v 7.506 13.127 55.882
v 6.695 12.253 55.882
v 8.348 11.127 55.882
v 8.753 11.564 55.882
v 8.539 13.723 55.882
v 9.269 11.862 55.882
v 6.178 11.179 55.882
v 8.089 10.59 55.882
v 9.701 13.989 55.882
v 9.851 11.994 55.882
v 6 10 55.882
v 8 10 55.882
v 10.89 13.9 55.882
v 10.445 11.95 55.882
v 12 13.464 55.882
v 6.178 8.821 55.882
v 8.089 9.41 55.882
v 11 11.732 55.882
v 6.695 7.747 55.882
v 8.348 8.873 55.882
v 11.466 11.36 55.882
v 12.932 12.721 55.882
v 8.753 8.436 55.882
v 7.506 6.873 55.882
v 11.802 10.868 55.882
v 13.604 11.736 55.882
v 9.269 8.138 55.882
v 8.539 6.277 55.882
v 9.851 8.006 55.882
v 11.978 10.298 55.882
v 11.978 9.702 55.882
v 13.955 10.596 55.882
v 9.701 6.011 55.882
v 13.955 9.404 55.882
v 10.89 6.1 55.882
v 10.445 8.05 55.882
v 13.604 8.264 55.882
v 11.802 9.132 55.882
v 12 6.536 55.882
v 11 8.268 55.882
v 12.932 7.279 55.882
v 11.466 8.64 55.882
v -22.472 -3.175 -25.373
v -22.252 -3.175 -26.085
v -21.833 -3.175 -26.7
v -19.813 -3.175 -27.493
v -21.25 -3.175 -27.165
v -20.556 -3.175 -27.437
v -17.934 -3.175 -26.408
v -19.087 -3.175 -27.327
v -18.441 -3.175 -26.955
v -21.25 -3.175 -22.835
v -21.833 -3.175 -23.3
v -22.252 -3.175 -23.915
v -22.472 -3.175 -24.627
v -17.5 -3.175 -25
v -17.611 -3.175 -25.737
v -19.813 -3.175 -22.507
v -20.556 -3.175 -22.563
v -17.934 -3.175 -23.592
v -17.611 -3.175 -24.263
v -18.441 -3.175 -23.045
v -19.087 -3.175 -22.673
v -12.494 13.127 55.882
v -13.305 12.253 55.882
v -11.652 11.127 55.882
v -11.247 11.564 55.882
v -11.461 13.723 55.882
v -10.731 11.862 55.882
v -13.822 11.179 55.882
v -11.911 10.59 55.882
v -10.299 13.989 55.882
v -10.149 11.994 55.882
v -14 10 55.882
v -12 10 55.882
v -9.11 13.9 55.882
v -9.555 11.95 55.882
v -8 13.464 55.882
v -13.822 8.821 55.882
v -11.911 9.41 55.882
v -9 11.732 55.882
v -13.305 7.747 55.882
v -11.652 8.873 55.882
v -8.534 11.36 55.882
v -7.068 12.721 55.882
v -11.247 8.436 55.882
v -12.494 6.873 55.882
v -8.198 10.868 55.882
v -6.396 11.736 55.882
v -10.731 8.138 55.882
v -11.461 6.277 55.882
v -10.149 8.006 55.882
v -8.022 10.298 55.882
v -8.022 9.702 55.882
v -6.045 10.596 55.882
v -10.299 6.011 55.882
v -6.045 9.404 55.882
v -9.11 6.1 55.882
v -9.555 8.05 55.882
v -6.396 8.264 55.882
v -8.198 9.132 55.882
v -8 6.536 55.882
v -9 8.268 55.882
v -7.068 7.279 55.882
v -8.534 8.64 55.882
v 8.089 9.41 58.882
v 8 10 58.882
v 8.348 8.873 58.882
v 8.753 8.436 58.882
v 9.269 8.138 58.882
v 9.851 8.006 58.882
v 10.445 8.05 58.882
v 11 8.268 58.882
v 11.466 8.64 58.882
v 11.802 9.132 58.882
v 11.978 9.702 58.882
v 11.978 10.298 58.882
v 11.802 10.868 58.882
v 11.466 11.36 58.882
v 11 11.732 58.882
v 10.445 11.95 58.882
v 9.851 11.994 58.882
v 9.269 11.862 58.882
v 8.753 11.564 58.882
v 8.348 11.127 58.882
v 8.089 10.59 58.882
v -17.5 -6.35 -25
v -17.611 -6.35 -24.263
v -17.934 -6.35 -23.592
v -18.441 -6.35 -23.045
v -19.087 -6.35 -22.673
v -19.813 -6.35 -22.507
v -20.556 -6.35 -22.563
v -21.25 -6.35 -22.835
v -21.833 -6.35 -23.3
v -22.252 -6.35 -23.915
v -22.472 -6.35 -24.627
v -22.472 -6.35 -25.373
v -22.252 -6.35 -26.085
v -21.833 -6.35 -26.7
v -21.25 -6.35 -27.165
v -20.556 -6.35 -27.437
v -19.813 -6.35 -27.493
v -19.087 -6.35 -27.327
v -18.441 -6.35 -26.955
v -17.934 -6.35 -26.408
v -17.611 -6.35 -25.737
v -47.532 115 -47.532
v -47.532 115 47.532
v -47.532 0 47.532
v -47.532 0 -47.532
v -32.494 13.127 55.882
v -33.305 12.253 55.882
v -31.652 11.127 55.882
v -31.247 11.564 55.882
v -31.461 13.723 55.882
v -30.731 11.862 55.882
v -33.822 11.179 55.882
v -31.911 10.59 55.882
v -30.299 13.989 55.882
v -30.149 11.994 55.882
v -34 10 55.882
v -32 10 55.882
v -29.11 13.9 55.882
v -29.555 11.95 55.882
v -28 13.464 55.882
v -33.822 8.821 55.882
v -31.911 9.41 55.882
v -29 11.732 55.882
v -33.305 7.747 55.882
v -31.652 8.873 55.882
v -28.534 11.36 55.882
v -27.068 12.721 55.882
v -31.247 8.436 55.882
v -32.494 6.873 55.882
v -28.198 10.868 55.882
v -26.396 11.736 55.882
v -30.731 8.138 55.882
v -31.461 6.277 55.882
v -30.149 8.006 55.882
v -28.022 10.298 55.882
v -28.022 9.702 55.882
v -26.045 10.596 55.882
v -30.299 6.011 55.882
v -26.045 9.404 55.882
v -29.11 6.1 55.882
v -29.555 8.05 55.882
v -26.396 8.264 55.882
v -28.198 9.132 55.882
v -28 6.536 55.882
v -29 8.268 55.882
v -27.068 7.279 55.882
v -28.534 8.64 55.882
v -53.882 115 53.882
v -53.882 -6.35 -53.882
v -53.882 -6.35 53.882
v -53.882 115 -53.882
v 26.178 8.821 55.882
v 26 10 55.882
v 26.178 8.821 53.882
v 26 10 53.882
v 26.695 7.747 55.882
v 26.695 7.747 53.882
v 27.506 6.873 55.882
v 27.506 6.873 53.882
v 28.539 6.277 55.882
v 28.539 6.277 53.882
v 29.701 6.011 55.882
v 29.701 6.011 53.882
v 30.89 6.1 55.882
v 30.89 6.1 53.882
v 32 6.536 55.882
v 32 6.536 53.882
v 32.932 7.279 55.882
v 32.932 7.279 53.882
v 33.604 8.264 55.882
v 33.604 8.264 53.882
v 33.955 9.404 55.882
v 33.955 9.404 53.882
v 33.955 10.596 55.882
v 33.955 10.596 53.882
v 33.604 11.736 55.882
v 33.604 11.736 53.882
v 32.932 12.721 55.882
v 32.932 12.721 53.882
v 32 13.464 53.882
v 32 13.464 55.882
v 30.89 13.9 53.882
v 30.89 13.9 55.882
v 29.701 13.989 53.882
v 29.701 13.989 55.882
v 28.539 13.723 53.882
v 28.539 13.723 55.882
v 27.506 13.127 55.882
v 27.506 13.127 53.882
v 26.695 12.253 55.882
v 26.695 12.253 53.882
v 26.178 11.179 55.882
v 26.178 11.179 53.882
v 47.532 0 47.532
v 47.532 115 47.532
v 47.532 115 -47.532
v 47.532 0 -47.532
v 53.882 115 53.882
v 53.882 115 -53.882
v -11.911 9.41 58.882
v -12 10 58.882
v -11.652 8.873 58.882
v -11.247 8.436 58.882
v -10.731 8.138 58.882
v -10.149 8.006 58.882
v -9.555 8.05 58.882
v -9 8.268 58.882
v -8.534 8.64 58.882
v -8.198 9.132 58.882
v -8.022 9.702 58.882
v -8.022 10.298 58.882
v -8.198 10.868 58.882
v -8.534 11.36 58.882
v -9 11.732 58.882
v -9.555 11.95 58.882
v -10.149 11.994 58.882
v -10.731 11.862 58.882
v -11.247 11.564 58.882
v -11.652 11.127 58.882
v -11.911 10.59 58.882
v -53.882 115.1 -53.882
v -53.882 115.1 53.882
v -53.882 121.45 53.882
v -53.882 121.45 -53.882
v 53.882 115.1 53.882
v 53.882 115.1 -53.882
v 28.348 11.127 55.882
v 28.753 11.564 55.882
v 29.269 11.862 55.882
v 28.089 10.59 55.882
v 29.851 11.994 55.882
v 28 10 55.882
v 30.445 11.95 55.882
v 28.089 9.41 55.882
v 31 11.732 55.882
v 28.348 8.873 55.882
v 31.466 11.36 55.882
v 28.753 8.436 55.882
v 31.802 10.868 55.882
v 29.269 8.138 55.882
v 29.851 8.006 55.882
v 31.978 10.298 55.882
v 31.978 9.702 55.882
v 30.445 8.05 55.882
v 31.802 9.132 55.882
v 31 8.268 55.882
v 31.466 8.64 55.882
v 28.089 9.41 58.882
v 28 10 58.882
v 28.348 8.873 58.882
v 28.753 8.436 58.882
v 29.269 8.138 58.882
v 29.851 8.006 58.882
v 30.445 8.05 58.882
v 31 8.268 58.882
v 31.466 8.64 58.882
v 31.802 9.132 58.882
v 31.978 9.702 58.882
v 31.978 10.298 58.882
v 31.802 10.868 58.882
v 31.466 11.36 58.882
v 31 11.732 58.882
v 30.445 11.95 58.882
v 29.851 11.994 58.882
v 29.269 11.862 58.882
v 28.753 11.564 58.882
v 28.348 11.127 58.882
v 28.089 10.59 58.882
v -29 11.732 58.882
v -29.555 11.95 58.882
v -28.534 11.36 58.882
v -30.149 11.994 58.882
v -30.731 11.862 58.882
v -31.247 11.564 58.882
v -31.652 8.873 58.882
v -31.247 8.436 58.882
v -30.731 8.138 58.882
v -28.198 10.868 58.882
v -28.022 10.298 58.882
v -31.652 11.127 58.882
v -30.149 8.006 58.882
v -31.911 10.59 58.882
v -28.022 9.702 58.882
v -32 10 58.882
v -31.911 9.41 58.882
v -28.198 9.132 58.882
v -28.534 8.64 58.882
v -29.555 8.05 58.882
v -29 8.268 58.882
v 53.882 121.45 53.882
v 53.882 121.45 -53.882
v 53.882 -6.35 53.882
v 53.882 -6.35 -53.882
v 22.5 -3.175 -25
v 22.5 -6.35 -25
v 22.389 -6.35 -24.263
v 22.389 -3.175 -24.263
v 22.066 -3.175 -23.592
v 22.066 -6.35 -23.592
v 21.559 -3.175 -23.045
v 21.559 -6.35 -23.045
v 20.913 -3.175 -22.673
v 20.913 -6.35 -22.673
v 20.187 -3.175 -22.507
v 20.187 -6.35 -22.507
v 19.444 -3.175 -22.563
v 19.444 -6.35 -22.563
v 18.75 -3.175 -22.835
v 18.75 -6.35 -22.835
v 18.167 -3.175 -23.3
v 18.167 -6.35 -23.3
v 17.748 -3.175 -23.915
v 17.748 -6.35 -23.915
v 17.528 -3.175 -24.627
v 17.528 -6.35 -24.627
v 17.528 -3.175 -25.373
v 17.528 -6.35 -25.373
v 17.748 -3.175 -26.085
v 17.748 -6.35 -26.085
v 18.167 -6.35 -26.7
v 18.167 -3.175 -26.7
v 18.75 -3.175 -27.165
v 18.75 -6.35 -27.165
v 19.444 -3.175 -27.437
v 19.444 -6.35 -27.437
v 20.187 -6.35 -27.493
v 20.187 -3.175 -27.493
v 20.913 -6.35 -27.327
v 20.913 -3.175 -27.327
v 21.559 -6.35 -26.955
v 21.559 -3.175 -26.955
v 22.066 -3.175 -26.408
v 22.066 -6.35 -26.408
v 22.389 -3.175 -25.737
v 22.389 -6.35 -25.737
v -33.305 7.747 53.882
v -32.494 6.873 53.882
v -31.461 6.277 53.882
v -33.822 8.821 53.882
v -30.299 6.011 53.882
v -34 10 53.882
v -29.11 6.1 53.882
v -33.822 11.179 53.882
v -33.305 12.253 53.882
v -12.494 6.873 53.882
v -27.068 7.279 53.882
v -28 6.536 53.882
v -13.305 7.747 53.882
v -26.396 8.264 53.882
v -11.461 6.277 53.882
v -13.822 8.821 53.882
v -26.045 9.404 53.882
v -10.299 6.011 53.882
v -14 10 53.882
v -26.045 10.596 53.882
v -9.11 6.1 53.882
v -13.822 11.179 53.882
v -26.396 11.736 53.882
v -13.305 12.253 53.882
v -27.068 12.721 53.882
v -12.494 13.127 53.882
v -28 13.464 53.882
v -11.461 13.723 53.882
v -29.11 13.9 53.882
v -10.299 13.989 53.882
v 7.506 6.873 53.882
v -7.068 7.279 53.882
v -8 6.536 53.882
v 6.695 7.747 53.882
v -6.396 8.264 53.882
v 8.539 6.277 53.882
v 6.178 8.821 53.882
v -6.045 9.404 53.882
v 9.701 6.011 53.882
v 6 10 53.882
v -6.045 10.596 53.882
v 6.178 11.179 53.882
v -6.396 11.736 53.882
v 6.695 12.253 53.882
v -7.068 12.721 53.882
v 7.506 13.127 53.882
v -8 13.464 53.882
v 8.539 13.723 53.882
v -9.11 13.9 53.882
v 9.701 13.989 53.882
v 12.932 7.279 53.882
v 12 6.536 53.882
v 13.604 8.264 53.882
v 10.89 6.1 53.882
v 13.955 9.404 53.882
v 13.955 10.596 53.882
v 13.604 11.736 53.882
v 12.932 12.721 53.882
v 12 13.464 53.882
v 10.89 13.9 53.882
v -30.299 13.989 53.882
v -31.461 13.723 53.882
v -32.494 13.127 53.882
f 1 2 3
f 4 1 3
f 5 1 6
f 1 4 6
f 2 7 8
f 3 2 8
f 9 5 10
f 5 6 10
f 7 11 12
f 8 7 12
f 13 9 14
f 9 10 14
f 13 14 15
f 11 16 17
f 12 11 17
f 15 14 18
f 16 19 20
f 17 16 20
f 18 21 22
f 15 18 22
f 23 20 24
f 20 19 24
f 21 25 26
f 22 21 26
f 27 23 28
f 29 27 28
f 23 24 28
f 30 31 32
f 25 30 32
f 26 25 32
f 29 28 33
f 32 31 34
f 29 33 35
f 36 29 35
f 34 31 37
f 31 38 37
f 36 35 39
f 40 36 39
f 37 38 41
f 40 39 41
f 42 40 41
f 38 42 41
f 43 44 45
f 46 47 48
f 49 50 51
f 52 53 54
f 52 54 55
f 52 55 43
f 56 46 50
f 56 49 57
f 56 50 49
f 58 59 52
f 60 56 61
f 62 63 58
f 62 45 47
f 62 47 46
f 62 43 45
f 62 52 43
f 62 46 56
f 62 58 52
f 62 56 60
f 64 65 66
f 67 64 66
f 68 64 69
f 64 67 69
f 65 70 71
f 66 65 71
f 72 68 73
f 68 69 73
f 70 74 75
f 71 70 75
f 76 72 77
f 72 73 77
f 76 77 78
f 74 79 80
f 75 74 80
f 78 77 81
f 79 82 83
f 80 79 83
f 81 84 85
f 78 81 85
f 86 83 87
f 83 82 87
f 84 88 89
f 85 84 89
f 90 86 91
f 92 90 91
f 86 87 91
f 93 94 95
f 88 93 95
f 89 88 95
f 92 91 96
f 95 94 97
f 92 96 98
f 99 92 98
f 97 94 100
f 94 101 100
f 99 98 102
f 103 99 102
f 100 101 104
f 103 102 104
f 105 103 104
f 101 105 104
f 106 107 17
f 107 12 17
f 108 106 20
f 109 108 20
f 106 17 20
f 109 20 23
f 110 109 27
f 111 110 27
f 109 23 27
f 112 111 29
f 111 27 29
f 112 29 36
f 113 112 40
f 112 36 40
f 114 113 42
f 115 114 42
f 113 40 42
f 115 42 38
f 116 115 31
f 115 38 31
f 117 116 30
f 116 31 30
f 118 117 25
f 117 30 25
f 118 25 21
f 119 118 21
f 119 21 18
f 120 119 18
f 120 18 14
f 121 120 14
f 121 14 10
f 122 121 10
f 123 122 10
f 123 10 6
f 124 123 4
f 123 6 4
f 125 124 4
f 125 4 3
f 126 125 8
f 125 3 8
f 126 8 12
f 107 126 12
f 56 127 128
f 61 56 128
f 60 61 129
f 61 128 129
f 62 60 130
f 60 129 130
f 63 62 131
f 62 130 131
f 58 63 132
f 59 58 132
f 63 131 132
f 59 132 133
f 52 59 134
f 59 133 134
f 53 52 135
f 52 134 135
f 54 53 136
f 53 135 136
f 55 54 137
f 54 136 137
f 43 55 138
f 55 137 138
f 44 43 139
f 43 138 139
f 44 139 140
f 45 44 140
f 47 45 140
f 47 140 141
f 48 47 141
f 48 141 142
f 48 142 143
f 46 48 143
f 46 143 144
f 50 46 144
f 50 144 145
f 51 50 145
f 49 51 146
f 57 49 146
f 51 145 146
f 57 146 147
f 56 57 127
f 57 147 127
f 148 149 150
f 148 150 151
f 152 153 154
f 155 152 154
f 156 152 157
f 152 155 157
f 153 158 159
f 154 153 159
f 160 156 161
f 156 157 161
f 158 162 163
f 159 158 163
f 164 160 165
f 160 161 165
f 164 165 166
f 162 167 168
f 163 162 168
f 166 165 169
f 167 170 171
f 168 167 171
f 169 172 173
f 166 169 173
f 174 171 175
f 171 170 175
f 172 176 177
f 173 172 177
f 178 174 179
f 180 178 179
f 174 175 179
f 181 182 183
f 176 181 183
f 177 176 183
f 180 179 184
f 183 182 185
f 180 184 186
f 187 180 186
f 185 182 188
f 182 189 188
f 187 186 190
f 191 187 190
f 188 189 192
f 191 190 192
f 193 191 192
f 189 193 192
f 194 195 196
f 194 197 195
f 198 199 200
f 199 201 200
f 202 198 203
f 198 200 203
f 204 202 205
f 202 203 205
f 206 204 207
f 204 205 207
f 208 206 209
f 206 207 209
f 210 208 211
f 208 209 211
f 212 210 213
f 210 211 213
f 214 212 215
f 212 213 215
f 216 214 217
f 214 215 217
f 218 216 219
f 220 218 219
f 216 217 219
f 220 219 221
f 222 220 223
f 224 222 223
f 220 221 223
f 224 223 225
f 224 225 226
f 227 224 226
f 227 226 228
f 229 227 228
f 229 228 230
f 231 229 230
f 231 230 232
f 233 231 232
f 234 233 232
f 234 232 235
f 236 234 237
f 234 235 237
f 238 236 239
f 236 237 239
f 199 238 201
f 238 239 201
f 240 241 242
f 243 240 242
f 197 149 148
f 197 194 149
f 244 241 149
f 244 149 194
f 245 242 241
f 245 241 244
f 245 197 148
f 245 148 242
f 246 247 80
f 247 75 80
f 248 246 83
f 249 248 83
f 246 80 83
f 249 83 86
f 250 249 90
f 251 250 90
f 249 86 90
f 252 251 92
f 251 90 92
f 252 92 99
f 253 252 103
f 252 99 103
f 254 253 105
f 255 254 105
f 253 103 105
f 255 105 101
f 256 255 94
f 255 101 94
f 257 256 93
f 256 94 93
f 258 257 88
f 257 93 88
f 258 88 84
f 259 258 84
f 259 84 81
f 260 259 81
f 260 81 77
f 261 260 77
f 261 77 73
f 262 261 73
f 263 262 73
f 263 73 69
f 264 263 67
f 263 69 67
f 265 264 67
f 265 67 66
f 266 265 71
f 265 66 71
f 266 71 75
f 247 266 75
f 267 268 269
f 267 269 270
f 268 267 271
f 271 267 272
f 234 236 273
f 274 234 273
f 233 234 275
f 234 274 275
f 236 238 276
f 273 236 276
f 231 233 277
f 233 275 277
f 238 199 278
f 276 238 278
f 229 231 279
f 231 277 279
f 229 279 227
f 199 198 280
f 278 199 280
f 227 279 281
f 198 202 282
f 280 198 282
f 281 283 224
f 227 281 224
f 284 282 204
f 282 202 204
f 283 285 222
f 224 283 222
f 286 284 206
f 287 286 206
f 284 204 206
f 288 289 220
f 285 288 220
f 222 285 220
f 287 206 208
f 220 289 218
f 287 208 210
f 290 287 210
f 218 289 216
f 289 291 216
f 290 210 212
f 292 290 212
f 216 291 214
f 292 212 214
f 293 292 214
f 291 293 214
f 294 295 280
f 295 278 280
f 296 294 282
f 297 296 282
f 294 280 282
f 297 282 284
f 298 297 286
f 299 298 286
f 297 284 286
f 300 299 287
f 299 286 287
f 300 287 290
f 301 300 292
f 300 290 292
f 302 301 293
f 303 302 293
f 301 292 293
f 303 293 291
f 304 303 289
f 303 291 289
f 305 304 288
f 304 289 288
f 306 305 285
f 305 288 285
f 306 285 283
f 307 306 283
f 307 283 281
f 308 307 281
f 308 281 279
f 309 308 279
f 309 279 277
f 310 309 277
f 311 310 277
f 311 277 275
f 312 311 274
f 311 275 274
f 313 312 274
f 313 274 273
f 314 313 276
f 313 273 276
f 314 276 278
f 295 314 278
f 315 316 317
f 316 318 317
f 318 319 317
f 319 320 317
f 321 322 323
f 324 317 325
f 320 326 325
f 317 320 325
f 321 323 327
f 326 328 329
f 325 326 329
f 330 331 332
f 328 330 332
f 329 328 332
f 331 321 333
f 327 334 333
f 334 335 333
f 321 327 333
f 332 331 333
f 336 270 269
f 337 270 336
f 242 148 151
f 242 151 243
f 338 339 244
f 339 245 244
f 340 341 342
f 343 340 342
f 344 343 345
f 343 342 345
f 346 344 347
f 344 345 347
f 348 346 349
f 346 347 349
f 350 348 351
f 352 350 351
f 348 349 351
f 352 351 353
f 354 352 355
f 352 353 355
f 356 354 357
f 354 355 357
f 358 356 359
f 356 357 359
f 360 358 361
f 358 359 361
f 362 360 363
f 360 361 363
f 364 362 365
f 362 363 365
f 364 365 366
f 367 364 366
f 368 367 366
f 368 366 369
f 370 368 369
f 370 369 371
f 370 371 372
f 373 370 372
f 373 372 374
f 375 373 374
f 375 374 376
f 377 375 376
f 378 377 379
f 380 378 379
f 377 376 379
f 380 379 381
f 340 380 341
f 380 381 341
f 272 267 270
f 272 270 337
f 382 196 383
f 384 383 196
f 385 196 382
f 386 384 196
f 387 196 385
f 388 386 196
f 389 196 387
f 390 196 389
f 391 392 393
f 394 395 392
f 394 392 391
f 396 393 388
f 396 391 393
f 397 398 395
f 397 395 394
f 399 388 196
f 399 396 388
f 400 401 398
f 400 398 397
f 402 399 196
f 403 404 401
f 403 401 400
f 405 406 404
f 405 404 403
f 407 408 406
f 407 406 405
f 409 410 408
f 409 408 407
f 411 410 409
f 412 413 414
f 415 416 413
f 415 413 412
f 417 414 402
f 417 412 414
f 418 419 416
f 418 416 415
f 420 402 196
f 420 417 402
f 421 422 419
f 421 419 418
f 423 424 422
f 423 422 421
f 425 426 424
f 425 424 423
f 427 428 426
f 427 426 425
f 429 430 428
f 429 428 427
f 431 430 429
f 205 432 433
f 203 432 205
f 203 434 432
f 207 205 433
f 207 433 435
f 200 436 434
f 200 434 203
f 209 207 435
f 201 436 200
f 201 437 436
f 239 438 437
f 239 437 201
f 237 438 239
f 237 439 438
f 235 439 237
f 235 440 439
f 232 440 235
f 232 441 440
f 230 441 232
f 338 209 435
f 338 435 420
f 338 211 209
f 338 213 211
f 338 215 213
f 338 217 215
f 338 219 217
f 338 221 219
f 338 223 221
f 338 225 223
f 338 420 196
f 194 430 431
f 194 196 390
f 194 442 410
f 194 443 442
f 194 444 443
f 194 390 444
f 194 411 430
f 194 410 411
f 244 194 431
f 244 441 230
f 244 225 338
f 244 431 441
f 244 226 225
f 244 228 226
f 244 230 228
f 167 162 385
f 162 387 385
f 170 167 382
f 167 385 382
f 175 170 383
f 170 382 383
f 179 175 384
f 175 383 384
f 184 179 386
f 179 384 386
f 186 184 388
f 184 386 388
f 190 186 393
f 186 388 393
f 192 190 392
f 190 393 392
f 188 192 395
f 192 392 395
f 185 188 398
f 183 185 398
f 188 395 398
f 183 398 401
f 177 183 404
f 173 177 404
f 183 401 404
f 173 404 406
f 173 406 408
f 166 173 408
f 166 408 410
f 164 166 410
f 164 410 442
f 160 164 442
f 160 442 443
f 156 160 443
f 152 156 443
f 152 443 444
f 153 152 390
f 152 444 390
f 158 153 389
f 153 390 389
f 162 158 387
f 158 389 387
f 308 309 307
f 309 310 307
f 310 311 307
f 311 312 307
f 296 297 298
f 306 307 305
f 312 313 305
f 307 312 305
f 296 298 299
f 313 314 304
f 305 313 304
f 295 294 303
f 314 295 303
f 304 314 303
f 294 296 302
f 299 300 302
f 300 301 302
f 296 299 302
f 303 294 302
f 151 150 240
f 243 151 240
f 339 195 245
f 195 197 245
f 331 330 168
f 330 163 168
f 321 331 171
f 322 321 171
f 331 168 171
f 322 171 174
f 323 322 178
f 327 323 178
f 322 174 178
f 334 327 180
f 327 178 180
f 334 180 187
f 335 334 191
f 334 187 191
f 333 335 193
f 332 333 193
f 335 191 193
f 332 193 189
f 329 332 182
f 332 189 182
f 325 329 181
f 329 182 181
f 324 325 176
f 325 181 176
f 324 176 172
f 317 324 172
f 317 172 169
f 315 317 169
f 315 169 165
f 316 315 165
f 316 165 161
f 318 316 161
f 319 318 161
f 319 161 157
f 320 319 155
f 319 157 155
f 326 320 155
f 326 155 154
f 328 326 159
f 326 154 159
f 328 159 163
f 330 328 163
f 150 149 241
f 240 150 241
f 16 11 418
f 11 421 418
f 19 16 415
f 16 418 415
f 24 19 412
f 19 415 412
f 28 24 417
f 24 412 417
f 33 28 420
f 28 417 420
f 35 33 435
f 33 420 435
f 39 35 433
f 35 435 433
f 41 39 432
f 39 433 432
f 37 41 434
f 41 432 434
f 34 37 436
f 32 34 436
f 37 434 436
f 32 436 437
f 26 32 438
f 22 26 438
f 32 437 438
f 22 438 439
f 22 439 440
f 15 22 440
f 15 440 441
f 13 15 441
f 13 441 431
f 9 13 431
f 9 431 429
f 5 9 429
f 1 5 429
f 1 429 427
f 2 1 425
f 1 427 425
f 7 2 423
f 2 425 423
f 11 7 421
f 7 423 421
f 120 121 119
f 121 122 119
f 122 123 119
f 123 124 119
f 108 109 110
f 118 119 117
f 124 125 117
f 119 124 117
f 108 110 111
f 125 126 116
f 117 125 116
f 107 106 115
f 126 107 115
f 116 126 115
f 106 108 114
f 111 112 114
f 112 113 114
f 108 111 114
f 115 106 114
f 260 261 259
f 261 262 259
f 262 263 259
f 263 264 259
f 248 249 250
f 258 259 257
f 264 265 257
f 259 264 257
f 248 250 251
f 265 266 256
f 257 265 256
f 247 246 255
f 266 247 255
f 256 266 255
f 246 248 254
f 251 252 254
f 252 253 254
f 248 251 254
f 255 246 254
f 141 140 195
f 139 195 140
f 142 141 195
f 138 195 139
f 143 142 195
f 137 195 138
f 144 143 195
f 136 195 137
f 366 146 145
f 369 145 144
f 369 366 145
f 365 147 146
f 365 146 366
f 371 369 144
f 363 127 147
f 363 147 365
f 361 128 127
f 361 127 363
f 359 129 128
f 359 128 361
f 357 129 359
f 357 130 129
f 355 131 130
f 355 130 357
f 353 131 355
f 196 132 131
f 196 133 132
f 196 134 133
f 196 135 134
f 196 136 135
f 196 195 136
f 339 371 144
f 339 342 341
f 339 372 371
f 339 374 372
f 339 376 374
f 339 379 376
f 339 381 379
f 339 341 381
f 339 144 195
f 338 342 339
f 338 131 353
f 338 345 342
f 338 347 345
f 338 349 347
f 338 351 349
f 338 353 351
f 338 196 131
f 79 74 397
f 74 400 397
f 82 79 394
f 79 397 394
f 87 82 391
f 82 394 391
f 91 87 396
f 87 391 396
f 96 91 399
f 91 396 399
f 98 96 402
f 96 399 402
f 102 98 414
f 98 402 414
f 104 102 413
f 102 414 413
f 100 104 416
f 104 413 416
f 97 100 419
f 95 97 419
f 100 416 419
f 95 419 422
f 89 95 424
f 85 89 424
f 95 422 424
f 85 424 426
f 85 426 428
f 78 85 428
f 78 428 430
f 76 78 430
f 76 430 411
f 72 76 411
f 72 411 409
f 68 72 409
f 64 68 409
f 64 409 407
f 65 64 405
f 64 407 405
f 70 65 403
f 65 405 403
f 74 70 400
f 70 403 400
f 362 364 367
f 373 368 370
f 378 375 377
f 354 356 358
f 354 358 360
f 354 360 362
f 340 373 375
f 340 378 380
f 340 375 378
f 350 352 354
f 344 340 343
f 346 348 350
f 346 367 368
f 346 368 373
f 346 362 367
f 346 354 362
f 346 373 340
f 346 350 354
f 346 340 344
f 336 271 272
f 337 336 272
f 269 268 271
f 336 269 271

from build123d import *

# Parameters (mm, degrees)
SKETCH1_W           = 107.763073452
SKETCH1_H           = 107.763073452
SKETCH1_W_2         = 95.063073452
SKETCH1_H_2         = 95.063073452
BOSS_EXTRUDE1_DEPTH = 115
SKETCH2_W           = 107.763073452
SKETCH2_H           = 107.763073452
BOSS_EXTRUDE2_DEPTH = 6.35
SKETCH3_W           = 107.763073452
SKETCH3_H           = 107.763073452
BOSS_EXTRUDE3_DEPTH = 6.35
SKETCH4_R           = 2.5
CUT_EXTRUDE1_DEPTH  = 3.175
LPATTERN1_COUNT     = 4
LPATTERN1_PITCH     = 20


with BuildPart() as part:
    # Sketch1 → Boss-Extrude1 (new body)
    with BuildSketch(Plane(origin=(0, 0, 0), x_dir=(1, 0, 0), z_dir=(0, 1, 0))):
        Rectangle(SKETCH1_W, SKETCH1_H)
        Rectangle(SKETCH1_W_2, SKETCH1_H_2, mode=Mode.SUBTRACT)
    extrude(amount=BOSS_EXTRUDE1_DEPTH)

    # Sketch2 → Boss-Extrude2 (add)
    with BuildSketch(Plane.XZ):
        Rectangle(SKETCH2_W, SKETCH2_H)
    extrude(amount=BOSS_EXTRUDE2_DEPTH)

    # Sketch4 → Cut-Extrude1 (cut, symmetric)
    with BuildSketch(Plane.XZ.offset(6.35)):
        with Locations((-20, -25)):
            Circle(SKETCH4_R)
        with Locations((20, -25)):
            Circle(SKETCH4_R)
    extrude(amount=CUT_EXTRUDE1_DEPTH, both=True, mode=Mode.SUBTRACT)

    # Sketch6 → Revolve1 (revolve)
    with BuildSketch(Plane(origin=(0, 10, 0), x_dir=(1, 0, 0), z_dir=(0, 1, 0))):
        Polygon((-30, -53.881536726), (-30, -58.881536726), (-32, -58.881536726), (-32, -55.881536726), (-34, -55.881536726), (-34, -53.881536726), align=None)
    revolve1 = revolve(axis=Axis((-30, 10, 53.881536726), (0, 0, 1)))

    # LPattern1: Revolve1 ×4
    with Locations(*[(i * LPATTERN1_PITCH, 0, 0) for i in range(1, LPATTERN1_COUNT)]):
        add(revolve1)


with BuildPart() as body_2:
    # Sketch3 → Boss-Extrude3 (new body)
    with BuildSketch(Plane(origin=(0, 115.1, 0), x_dir=(1, 0, 0), z_dir=(0, 1, 0))):
        Rectangle(SKETCH3_W, SKETCH3_H)
    extrude(amount=BOSS_EXTRUDE3_DEPTH)


solid = Compound([part.part, body_2.part])
